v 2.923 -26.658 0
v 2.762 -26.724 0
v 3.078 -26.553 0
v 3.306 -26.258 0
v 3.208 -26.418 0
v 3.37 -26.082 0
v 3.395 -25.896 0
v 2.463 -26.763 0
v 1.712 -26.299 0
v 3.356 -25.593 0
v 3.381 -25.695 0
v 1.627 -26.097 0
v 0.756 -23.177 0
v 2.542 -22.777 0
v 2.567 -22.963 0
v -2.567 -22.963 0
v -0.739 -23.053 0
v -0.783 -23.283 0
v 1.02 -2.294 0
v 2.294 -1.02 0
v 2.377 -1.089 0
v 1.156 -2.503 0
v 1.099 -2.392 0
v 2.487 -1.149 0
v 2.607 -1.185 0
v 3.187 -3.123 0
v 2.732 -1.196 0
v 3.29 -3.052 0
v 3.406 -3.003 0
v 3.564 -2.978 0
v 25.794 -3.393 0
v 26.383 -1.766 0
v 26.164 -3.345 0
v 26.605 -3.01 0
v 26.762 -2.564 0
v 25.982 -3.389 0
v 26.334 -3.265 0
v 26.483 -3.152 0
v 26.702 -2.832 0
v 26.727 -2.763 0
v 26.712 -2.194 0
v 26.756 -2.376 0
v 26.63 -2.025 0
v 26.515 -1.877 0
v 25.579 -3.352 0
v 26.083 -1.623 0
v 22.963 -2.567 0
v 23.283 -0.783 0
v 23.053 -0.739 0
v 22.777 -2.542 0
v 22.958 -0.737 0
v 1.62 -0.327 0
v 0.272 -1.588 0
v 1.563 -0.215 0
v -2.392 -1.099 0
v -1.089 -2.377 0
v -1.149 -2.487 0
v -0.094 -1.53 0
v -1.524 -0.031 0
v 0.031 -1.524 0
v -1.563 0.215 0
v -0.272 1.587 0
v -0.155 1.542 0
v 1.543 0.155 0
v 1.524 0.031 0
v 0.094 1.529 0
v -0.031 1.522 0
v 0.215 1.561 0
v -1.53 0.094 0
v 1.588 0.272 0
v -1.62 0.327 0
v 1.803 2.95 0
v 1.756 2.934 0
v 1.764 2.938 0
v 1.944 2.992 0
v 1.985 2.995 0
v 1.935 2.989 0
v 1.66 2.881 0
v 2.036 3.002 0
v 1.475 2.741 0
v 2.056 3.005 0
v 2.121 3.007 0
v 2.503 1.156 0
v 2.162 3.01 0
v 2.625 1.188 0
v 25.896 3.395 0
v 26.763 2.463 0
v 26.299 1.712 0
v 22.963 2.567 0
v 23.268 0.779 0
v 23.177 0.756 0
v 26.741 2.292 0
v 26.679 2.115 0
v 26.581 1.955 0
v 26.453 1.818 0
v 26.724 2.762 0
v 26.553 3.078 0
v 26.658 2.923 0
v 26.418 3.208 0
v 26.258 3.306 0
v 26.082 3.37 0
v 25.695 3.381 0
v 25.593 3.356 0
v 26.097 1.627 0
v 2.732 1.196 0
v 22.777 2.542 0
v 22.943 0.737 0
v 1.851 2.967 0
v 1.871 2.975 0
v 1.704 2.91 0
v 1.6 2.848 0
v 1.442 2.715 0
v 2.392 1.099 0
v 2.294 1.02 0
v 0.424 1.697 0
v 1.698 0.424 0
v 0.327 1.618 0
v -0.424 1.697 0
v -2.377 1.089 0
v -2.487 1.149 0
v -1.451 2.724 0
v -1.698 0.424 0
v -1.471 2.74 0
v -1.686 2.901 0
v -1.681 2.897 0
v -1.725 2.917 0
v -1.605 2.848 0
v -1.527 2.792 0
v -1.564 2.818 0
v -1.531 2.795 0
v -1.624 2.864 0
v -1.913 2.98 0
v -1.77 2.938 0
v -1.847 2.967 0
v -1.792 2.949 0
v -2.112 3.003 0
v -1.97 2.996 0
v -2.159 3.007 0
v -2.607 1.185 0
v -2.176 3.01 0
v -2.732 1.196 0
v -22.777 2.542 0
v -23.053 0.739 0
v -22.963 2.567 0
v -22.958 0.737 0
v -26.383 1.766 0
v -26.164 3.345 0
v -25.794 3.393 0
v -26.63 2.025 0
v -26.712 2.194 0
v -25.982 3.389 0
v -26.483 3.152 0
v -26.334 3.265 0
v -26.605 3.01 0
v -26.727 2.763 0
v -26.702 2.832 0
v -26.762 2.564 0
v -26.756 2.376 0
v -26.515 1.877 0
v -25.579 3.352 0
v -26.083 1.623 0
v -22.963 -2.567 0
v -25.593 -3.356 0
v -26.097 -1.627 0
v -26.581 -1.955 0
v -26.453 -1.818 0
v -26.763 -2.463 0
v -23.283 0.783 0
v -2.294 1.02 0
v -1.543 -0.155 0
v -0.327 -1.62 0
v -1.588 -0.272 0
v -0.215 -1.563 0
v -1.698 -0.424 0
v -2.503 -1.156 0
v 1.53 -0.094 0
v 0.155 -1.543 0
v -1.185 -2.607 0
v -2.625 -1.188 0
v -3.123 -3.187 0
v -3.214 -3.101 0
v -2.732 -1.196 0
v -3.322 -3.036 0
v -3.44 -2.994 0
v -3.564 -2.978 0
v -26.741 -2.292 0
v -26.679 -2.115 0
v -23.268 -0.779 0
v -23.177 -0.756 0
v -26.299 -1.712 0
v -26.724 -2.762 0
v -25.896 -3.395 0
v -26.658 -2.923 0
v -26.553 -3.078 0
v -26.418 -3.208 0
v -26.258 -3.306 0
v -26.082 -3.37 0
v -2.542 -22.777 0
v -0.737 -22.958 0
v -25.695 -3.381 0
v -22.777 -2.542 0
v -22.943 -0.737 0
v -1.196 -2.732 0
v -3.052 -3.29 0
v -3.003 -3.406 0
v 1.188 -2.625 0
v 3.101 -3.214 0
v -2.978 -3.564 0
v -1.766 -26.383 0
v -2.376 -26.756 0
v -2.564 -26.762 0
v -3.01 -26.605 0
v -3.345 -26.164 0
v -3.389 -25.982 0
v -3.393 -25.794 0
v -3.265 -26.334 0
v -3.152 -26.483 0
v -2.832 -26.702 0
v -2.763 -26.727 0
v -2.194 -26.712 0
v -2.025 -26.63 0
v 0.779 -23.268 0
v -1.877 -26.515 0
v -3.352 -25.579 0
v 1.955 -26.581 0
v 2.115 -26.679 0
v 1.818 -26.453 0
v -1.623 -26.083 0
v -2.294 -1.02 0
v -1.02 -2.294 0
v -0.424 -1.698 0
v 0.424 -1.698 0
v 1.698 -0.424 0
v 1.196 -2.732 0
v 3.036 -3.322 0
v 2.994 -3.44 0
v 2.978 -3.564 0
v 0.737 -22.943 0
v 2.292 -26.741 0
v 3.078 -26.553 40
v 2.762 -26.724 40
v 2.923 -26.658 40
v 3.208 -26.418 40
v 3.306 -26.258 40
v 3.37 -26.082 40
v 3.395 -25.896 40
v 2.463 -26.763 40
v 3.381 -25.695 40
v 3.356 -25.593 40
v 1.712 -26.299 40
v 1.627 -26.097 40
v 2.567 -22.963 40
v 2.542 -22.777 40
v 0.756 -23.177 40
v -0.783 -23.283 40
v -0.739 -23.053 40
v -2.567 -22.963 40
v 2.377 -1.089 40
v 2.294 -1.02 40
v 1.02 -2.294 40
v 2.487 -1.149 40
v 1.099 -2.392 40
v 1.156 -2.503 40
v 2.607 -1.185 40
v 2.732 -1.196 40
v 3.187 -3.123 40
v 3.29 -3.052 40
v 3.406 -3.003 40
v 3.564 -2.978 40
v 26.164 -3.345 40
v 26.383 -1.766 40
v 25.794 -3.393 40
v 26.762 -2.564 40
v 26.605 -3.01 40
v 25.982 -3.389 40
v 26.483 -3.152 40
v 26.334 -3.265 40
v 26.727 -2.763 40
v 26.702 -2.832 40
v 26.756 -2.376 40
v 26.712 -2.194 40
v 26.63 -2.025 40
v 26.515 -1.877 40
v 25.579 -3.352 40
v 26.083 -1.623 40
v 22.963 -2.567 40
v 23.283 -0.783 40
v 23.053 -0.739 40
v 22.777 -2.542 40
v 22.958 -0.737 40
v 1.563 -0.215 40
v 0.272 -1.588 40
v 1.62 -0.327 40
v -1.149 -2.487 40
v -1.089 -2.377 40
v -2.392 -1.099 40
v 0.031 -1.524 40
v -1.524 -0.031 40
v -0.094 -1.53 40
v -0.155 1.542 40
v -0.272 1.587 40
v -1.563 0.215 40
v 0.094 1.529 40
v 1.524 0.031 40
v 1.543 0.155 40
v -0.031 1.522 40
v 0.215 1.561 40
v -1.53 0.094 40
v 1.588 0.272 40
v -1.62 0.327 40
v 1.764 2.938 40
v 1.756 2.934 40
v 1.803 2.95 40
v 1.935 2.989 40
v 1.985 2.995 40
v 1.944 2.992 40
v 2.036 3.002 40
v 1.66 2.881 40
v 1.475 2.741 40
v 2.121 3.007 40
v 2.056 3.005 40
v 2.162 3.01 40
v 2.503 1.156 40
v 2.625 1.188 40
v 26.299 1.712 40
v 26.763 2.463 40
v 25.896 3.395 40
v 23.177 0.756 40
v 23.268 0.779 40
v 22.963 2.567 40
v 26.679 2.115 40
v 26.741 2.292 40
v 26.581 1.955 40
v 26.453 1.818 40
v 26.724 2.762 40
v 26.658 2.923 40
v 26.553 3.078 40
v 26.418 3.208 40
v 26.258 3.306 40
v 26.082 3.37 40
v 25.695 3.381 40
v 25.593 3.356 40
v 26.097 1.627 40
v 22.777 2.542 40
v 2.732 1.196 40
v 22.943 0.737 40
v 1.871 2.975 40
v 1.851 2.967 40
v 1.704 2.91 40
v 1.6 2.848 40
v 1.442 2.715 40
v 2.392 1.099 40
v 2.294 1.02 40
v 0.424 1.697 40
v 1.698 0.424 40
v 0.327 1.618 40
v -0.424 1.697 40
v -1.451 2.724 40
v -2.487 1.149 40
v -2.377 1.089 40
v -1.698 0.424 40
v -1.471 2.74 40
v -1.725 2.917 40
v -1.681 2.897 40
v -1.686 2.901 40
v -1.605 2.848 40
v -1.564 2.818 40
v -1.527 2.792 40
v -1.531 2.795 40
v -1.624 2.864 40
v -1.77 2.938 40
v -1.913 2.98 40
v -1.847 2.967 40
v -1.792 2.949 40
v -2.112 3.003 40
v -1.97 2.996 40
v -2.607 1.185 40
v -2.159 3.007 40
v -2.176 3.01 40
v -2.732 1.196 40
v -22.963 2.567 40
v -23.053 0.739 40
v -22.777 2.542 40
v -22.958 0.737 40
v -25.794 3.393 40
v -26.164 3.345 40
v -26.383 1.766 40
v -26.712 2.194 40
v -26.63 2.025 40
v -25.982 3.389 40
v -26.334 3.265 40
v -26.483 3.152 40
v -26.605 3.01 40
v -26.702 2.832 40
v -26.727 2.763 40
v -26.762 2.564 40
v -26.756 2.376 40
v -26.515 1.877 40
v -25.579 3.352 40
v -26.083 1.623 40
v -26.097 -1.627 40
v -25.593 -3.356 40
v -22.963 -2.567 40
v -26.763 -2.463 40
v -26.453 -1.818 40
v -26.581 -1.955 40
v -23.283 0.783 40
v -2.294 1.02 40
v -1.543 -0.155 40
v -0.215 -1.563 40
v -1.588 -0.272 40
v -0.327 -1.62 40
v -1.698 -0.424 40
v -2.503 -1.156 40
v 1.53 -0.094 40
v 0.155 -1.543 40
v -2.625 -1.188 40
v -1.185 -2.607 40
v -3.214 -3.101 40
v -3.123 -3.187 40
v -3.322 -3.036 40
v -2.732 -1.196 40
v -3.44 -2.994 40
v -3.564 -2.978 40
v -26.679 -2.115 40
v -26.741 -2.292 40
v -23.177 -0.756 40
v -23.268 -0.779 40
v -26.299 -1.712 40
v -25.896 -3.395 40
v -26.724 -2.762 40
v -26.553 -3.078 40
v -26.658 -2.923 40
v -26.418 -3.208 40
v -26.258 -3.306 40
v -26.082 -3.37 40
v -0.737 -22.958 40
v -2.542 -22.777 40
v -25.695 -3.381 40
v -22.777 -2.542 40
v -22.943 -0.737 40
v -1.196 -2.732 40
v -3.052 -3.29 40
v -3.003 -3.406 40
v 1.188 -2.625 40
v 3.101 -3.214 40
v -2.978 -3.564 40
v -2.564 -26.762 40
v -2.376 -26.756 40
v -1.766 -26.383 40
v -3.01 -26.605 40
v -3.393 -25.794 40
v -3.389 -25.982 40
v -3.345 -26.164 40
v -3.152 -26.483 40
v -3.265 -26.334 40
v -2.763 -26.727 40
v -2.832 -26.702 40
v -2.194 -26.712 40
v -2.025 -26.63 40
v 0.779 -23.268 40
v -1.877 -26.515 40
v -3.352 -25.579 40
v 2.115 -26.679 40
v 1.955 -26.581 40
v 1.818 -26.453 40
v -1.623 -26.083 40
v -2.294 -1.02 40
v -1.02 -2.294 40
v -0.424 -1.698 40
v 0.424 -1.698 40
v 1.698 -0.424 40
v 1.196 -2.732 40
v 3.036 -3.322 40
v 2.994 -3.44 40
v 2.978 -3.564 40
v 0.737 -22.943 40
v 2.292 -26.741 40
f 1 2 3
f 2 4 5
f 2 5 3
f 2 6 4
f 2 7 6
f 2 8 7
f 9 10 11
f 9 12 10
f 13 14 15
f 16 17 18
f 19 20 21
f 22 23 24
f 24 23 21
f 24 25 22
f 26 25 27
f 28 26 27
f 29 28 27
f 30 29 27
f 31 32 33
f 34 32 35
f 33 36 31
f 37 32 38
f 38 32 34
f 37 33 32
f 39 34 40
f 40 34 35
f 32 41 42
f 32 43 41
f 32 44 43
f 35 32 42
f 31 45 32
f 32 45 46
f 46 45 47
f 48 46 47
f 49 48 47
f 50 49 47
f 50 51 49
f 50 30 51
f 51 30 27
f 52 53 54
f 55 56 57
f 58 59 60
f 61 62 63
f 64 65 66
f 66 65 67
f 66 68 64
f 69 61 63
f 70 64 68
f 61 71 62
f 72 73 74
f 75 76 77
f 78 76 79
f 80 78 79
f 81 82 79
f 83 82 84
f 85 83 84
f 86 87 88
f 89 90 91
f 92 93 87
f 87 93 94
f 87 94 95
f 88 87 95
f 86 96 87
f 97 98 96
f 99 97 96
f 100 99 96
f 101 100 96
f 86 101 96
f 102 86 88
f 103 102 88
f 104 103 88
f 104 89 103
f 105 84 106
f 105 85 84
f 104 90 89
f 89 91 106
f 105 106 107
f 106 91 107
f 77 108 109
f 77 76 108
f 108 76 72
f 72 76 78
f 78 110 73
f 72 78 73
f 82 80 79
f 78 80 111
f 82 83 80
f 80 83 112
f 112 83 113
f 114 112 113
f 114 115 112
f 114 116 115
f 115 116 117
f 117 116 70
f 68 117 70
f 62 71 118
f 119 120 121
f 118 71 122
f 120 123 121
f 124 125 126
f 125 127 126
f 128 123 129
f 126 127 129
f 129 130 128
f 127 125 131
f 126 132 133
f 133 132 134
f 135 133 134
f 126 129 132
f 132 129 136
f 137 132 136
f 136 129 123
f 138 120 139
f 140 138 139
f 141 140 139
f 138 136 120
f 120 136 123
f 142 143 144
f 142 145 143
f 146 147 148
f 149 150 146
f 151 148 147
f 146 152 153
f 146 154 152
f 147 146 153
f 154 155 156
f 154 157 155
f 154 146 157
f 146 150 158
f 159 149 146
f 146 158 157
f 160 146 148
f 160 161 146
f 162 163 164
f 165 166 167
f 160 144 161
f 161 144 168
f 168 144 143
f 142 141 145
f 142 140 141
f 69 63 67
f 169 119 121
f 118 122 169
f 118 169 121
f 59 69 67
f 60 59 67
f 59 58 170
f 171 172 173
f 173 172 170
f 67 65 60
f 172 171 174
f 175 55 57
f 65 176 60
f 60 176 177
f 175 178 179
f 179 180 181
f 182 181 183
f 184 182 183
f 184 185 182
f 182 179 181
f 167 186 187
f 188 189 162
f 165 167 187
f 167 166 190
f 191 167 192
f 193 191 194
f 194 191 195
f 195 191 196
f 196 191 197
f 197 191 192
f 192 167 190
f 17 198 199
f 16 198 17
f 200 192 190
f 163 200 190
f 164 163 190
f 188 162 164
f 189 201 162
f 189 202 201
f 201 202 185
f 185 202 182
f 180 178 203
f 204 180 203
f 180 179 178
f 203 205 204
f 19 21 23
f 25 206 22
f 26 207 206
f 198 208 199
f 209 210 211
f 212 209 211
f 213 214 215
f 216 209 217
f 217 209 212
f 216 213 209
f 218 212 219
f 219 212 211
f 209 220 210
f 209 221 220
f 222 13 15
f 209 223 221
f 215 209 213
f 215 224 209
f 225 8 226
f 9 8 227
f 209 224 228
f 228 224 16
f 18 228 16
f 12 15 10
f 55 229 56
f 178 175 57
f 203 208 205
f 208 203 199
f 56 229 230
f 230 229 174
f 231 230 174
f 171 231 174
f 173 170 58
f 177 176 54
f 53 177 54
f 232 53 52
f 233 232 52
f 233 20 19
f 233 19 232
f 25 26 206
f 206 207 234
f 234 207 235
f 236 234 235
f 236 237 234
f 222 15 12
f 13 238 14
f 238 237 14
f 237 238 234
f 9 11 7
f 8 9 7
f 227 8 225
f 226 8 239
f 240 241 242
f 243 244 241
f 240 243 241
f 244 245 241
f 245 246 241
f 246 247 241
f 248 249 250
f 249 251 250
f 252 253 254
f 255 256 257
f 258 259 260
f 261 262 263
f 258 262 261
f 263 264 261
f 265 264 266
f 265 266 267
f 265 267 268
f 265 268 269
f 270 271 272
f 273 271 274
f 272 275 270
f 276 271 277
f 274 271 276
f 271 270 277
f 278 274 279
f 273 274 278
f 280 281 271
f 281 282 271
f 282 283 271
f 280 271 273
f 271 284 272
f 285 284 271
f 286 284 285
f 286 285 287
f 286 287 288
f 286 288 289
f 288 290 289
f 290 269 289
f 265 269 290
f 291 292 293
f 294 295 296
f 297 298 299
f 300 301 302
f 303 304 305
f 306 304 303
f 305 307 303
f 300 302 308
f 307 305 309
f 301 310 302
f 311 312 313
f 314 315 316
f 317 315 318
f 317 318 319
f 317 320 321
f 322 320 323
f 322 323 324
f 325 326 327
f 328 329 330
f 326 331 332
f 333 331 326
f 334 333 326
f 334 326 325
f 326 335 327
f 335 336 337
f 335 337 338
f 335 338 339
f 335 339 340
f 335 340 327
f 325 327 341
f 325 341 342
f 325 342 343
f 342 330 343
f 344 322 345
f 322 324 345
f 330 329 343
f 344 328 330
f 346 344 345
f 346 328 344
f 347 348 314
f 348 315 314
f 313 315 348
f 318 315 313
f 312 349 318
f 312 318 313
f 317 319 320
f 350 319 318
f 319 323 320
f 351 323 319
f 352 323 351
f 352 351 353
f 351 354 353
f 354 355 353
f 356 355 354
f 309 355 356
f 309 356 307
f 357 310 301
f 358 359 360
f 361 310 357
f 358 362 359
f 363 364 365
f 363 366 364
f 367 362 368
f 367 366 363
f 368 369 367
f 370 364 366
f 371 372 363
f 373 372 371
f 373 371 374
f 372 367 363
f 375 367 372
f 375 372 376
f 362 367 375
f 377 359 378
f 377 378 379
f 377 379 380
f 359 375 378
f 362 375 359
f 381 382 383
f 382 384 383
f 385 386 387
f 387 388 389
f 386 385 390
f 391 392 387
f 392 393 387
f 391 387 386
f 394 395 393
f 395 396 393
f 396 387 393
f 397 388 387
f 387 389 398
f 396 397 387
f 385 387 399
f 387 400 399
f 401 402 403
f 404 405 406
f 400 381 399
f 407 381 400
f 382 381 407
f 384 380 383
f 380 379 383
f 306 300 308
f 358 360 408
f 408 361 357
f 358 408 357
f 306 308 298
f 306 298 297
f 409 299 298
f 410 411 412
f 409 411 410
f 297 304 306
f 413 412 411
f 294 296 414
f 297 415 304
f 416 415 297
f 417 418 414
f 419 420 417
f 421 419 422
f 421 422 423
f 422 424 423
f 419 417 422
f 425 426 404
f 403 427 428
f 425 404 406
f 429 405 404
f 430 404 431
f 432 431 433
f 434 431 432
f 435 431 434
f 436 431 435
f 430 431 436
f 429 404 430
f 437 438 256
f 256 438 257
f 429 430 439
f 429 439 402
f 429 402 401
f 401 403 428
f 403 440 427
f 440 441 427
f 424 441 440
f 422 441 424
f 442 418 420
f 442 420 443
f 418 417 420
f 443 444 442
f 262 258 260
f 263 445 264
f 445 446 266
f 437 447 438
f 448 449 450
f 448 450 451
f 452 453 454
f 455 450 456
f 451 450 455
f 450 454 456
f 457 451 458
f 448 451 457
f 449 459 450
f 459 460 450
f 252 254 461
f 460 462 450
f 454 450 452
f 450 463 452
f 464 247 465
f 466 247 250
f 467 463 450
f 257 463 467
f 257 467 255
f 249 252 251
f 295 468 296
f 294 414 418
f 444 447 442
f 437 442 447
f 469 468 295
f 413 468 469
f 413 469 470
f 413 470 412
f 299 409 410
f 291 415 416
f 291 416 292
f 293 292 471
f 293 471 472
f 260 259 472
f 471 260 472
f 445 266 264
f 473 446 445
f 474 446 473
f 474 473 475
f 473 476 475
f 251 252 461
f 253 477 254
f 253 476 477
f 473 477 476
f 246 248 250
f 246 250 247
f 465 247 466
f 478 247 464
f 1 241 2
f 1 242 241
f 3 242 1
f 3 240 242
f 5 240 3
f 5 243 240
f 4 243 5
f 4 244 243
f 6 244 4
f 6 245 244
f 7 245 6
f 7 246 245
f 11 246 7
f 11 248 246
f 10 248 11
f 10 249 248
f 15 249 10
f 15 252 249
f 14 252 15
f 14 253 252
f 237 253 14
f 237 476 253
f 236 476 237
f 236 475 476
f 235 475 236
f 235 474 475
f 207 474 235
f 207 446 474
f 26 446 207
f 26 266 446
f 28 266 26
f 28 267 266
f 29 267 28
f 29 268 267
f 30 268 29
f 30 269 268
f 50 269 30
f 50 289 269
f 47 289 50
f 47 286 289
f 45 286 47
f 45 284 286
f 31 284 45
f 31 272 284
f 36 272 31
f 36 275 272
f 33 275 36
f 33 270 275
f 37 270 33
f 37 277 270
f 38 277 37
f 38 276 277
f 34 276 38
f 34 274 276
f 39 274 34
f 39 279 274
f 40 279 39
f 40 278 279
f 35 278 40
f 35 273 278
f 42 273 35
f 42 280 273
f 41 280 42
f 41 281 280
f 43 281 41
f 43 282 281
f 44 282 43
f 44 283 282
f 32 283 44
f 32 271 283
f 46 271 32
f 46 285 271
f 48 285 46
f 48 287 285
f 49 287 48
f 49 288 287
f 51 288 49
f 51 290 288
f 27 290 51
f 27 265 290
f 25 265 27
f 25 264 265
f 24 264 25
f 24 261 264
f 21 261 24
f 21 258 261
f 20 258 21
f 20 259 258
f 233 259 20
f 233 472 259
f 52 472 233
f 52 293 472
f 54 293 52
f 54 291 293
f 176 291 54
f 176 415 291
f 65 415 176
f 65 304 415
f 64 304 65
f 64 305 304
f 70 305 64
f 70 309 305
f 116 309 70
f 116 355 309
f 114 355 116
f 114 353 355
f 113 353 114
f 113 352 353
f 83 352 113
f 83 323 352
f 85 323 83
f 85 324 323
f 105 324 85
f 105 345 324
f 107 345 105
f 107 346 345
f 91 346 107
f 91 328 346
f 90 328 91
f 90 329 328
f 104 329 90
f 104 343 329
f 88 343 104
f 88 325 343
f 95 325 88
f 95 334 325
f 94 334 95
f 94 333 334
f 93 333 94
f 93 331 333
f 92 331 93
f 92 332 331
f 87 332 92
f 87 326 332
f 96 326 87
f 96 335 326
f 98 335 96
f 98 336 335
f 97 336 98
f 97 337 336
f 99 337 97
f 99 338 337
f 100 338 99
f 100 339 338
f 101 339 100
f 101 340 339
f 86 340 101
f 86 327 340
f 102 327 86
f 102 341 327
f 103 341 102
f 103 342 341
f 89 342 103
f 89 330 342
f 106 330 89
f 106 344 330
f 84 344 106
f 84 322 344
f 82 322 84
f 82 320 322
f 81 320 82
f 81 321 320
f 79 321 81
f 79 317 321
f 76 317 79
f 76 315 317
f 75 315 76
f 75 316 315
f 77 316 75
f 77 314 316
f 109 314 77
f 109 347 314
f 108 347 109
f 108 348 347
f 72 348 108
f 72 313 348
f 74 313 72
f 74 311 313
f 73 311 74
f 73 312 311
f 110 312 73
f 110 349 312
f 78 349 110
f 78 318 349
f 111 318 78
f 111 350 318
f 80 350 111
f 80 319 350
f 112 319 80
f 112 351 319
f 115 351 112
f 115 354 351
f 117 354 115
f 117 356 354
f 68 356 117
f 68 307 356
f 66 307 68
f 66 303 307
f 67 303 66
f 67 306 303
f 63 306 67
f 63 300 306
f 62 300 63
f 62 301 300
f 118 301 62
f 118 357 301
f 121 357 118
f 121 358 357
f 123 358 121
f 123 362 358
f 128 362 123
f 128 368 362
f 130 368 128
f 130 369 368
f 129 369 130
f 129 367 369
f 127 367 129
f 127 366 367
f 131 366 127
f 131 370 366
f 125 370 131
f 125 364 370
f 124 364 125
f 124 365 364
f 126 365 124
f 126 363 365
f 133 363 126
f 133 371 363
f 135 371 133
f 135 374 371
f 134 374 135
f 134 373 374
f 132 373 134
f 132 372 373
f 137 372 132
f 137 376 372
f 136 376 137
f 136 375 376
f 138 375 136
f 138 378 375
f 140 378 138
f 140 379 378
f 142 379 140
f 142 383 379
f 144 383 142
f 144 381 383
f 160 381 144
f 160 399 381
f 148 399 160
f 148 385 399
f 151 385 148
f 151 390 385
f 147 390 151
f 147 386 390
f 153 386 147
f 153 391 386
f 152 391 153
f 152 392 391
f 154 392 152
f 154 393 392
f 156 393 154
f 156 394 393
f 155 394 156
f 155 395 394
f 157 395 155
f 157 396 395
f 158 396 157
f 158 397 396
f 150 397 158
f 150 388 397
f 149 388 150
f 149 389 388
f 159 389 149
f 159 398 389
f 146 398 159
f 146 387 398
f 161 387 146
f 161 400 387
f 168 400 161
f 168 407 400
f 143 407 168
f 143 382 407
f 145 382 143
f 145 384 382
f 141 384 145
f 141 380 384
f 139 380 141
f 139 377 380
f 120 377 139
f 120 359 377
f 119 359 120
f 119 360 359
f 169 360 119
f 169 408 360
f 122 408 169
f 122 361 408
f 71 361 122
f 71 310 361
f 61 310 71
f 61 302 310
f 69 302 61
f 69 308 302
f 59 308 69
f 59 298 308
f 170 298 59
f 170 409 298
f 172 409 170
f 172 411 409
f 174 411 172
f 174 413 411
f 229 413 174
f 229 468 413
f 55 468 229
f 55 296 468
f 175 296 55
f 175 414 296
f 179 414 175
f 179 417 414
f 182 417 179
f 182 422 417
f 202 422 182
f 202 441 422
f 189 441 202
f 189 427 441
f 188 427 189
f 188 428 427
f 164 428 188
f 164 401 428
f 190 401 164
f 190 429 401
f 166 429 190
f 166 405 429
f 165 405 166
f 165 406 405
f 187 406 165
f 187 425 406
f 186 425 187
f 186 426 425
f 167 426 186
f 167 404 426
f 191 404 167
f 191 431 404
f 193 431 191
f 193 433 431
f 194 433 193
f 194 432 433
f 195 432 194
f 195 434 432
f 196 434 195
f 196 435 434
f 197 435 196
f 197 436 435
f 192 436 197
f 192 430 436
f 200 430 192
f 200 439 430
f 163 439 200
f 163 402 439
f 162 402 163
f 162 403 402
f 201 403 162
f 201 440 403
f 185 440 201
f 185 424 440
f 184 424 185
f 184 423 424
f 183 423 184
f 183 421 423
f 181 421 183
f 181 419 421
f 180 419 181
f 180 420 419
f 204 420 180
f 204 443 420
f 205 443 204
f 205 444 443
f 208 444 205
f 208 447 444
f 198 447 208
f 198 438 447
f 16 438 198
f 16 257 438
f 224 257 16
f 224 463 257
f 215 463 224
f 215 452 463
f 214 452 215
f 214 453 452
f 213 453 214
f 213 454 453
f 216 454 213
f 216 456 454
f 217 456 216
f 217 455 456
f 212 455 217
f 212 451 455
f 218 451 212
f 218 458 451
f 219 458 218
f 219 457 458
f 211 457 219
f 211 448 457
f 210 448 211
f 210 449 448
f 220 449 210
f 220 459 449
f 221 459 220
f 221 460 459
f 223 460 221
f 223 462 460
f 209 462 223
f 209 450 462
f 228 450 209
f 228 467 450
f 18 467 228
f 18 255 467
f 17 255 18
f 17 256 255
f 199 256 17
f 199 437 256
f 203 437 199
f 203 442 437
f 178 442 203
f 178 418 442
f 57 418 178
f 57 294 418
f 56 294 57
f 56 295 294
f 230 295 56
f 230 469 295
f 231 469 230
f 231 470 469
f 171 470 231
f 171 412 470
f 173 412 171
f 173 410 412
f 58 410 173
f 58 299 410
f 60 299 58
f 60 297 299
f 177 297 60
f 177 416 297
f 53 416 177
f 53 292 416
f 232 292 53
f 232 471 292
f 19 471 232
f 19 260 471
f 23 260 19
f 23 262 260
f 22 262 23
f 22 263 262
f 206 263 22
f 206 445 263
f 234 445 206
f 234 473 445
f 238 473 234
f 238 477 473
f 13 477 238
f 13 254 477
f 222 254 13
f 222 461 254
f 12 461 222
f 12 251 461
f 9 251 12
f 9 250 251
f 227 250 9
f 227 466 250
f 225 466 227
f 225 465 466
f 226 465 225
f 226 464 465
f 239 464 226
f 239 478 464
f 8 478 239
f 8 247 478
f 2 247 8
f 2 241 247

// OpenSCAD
length = 23;
gap_inner = 2.42;
pinch_angle = 1.3;
gauge = 1.8;

flare_length = 3;
flare_angle = 18;

eps = 0.001;

module leg_2d() {
  spread = gap_inner/2 + gauge/2;
  
  rotate([0, 0, 45])
    square([spread*sqrt(2), eps]);
  translate([spread, spread]) {
    rotate([0, 0, pinch_angle]) {
      square([eps, length - spread]);
      translate([0, length - spread])
        rotate([0, 0, -flare_angle])
          square([eps, flare_length]);
    }
  }
}

module piece_2d(n=3) {
  $fn = 30;
  roundoff = 0.6;
  
  offset(-roundoff)
    offset(gauge/2 + roundoff)
      for (a = [1:n])
        rotate([0, 0, a*90])
          for (b = [-1, 1])
            scale([b, 1])
              leg_2d();
}

linear_extrude(40)
  piece_2d(3);
